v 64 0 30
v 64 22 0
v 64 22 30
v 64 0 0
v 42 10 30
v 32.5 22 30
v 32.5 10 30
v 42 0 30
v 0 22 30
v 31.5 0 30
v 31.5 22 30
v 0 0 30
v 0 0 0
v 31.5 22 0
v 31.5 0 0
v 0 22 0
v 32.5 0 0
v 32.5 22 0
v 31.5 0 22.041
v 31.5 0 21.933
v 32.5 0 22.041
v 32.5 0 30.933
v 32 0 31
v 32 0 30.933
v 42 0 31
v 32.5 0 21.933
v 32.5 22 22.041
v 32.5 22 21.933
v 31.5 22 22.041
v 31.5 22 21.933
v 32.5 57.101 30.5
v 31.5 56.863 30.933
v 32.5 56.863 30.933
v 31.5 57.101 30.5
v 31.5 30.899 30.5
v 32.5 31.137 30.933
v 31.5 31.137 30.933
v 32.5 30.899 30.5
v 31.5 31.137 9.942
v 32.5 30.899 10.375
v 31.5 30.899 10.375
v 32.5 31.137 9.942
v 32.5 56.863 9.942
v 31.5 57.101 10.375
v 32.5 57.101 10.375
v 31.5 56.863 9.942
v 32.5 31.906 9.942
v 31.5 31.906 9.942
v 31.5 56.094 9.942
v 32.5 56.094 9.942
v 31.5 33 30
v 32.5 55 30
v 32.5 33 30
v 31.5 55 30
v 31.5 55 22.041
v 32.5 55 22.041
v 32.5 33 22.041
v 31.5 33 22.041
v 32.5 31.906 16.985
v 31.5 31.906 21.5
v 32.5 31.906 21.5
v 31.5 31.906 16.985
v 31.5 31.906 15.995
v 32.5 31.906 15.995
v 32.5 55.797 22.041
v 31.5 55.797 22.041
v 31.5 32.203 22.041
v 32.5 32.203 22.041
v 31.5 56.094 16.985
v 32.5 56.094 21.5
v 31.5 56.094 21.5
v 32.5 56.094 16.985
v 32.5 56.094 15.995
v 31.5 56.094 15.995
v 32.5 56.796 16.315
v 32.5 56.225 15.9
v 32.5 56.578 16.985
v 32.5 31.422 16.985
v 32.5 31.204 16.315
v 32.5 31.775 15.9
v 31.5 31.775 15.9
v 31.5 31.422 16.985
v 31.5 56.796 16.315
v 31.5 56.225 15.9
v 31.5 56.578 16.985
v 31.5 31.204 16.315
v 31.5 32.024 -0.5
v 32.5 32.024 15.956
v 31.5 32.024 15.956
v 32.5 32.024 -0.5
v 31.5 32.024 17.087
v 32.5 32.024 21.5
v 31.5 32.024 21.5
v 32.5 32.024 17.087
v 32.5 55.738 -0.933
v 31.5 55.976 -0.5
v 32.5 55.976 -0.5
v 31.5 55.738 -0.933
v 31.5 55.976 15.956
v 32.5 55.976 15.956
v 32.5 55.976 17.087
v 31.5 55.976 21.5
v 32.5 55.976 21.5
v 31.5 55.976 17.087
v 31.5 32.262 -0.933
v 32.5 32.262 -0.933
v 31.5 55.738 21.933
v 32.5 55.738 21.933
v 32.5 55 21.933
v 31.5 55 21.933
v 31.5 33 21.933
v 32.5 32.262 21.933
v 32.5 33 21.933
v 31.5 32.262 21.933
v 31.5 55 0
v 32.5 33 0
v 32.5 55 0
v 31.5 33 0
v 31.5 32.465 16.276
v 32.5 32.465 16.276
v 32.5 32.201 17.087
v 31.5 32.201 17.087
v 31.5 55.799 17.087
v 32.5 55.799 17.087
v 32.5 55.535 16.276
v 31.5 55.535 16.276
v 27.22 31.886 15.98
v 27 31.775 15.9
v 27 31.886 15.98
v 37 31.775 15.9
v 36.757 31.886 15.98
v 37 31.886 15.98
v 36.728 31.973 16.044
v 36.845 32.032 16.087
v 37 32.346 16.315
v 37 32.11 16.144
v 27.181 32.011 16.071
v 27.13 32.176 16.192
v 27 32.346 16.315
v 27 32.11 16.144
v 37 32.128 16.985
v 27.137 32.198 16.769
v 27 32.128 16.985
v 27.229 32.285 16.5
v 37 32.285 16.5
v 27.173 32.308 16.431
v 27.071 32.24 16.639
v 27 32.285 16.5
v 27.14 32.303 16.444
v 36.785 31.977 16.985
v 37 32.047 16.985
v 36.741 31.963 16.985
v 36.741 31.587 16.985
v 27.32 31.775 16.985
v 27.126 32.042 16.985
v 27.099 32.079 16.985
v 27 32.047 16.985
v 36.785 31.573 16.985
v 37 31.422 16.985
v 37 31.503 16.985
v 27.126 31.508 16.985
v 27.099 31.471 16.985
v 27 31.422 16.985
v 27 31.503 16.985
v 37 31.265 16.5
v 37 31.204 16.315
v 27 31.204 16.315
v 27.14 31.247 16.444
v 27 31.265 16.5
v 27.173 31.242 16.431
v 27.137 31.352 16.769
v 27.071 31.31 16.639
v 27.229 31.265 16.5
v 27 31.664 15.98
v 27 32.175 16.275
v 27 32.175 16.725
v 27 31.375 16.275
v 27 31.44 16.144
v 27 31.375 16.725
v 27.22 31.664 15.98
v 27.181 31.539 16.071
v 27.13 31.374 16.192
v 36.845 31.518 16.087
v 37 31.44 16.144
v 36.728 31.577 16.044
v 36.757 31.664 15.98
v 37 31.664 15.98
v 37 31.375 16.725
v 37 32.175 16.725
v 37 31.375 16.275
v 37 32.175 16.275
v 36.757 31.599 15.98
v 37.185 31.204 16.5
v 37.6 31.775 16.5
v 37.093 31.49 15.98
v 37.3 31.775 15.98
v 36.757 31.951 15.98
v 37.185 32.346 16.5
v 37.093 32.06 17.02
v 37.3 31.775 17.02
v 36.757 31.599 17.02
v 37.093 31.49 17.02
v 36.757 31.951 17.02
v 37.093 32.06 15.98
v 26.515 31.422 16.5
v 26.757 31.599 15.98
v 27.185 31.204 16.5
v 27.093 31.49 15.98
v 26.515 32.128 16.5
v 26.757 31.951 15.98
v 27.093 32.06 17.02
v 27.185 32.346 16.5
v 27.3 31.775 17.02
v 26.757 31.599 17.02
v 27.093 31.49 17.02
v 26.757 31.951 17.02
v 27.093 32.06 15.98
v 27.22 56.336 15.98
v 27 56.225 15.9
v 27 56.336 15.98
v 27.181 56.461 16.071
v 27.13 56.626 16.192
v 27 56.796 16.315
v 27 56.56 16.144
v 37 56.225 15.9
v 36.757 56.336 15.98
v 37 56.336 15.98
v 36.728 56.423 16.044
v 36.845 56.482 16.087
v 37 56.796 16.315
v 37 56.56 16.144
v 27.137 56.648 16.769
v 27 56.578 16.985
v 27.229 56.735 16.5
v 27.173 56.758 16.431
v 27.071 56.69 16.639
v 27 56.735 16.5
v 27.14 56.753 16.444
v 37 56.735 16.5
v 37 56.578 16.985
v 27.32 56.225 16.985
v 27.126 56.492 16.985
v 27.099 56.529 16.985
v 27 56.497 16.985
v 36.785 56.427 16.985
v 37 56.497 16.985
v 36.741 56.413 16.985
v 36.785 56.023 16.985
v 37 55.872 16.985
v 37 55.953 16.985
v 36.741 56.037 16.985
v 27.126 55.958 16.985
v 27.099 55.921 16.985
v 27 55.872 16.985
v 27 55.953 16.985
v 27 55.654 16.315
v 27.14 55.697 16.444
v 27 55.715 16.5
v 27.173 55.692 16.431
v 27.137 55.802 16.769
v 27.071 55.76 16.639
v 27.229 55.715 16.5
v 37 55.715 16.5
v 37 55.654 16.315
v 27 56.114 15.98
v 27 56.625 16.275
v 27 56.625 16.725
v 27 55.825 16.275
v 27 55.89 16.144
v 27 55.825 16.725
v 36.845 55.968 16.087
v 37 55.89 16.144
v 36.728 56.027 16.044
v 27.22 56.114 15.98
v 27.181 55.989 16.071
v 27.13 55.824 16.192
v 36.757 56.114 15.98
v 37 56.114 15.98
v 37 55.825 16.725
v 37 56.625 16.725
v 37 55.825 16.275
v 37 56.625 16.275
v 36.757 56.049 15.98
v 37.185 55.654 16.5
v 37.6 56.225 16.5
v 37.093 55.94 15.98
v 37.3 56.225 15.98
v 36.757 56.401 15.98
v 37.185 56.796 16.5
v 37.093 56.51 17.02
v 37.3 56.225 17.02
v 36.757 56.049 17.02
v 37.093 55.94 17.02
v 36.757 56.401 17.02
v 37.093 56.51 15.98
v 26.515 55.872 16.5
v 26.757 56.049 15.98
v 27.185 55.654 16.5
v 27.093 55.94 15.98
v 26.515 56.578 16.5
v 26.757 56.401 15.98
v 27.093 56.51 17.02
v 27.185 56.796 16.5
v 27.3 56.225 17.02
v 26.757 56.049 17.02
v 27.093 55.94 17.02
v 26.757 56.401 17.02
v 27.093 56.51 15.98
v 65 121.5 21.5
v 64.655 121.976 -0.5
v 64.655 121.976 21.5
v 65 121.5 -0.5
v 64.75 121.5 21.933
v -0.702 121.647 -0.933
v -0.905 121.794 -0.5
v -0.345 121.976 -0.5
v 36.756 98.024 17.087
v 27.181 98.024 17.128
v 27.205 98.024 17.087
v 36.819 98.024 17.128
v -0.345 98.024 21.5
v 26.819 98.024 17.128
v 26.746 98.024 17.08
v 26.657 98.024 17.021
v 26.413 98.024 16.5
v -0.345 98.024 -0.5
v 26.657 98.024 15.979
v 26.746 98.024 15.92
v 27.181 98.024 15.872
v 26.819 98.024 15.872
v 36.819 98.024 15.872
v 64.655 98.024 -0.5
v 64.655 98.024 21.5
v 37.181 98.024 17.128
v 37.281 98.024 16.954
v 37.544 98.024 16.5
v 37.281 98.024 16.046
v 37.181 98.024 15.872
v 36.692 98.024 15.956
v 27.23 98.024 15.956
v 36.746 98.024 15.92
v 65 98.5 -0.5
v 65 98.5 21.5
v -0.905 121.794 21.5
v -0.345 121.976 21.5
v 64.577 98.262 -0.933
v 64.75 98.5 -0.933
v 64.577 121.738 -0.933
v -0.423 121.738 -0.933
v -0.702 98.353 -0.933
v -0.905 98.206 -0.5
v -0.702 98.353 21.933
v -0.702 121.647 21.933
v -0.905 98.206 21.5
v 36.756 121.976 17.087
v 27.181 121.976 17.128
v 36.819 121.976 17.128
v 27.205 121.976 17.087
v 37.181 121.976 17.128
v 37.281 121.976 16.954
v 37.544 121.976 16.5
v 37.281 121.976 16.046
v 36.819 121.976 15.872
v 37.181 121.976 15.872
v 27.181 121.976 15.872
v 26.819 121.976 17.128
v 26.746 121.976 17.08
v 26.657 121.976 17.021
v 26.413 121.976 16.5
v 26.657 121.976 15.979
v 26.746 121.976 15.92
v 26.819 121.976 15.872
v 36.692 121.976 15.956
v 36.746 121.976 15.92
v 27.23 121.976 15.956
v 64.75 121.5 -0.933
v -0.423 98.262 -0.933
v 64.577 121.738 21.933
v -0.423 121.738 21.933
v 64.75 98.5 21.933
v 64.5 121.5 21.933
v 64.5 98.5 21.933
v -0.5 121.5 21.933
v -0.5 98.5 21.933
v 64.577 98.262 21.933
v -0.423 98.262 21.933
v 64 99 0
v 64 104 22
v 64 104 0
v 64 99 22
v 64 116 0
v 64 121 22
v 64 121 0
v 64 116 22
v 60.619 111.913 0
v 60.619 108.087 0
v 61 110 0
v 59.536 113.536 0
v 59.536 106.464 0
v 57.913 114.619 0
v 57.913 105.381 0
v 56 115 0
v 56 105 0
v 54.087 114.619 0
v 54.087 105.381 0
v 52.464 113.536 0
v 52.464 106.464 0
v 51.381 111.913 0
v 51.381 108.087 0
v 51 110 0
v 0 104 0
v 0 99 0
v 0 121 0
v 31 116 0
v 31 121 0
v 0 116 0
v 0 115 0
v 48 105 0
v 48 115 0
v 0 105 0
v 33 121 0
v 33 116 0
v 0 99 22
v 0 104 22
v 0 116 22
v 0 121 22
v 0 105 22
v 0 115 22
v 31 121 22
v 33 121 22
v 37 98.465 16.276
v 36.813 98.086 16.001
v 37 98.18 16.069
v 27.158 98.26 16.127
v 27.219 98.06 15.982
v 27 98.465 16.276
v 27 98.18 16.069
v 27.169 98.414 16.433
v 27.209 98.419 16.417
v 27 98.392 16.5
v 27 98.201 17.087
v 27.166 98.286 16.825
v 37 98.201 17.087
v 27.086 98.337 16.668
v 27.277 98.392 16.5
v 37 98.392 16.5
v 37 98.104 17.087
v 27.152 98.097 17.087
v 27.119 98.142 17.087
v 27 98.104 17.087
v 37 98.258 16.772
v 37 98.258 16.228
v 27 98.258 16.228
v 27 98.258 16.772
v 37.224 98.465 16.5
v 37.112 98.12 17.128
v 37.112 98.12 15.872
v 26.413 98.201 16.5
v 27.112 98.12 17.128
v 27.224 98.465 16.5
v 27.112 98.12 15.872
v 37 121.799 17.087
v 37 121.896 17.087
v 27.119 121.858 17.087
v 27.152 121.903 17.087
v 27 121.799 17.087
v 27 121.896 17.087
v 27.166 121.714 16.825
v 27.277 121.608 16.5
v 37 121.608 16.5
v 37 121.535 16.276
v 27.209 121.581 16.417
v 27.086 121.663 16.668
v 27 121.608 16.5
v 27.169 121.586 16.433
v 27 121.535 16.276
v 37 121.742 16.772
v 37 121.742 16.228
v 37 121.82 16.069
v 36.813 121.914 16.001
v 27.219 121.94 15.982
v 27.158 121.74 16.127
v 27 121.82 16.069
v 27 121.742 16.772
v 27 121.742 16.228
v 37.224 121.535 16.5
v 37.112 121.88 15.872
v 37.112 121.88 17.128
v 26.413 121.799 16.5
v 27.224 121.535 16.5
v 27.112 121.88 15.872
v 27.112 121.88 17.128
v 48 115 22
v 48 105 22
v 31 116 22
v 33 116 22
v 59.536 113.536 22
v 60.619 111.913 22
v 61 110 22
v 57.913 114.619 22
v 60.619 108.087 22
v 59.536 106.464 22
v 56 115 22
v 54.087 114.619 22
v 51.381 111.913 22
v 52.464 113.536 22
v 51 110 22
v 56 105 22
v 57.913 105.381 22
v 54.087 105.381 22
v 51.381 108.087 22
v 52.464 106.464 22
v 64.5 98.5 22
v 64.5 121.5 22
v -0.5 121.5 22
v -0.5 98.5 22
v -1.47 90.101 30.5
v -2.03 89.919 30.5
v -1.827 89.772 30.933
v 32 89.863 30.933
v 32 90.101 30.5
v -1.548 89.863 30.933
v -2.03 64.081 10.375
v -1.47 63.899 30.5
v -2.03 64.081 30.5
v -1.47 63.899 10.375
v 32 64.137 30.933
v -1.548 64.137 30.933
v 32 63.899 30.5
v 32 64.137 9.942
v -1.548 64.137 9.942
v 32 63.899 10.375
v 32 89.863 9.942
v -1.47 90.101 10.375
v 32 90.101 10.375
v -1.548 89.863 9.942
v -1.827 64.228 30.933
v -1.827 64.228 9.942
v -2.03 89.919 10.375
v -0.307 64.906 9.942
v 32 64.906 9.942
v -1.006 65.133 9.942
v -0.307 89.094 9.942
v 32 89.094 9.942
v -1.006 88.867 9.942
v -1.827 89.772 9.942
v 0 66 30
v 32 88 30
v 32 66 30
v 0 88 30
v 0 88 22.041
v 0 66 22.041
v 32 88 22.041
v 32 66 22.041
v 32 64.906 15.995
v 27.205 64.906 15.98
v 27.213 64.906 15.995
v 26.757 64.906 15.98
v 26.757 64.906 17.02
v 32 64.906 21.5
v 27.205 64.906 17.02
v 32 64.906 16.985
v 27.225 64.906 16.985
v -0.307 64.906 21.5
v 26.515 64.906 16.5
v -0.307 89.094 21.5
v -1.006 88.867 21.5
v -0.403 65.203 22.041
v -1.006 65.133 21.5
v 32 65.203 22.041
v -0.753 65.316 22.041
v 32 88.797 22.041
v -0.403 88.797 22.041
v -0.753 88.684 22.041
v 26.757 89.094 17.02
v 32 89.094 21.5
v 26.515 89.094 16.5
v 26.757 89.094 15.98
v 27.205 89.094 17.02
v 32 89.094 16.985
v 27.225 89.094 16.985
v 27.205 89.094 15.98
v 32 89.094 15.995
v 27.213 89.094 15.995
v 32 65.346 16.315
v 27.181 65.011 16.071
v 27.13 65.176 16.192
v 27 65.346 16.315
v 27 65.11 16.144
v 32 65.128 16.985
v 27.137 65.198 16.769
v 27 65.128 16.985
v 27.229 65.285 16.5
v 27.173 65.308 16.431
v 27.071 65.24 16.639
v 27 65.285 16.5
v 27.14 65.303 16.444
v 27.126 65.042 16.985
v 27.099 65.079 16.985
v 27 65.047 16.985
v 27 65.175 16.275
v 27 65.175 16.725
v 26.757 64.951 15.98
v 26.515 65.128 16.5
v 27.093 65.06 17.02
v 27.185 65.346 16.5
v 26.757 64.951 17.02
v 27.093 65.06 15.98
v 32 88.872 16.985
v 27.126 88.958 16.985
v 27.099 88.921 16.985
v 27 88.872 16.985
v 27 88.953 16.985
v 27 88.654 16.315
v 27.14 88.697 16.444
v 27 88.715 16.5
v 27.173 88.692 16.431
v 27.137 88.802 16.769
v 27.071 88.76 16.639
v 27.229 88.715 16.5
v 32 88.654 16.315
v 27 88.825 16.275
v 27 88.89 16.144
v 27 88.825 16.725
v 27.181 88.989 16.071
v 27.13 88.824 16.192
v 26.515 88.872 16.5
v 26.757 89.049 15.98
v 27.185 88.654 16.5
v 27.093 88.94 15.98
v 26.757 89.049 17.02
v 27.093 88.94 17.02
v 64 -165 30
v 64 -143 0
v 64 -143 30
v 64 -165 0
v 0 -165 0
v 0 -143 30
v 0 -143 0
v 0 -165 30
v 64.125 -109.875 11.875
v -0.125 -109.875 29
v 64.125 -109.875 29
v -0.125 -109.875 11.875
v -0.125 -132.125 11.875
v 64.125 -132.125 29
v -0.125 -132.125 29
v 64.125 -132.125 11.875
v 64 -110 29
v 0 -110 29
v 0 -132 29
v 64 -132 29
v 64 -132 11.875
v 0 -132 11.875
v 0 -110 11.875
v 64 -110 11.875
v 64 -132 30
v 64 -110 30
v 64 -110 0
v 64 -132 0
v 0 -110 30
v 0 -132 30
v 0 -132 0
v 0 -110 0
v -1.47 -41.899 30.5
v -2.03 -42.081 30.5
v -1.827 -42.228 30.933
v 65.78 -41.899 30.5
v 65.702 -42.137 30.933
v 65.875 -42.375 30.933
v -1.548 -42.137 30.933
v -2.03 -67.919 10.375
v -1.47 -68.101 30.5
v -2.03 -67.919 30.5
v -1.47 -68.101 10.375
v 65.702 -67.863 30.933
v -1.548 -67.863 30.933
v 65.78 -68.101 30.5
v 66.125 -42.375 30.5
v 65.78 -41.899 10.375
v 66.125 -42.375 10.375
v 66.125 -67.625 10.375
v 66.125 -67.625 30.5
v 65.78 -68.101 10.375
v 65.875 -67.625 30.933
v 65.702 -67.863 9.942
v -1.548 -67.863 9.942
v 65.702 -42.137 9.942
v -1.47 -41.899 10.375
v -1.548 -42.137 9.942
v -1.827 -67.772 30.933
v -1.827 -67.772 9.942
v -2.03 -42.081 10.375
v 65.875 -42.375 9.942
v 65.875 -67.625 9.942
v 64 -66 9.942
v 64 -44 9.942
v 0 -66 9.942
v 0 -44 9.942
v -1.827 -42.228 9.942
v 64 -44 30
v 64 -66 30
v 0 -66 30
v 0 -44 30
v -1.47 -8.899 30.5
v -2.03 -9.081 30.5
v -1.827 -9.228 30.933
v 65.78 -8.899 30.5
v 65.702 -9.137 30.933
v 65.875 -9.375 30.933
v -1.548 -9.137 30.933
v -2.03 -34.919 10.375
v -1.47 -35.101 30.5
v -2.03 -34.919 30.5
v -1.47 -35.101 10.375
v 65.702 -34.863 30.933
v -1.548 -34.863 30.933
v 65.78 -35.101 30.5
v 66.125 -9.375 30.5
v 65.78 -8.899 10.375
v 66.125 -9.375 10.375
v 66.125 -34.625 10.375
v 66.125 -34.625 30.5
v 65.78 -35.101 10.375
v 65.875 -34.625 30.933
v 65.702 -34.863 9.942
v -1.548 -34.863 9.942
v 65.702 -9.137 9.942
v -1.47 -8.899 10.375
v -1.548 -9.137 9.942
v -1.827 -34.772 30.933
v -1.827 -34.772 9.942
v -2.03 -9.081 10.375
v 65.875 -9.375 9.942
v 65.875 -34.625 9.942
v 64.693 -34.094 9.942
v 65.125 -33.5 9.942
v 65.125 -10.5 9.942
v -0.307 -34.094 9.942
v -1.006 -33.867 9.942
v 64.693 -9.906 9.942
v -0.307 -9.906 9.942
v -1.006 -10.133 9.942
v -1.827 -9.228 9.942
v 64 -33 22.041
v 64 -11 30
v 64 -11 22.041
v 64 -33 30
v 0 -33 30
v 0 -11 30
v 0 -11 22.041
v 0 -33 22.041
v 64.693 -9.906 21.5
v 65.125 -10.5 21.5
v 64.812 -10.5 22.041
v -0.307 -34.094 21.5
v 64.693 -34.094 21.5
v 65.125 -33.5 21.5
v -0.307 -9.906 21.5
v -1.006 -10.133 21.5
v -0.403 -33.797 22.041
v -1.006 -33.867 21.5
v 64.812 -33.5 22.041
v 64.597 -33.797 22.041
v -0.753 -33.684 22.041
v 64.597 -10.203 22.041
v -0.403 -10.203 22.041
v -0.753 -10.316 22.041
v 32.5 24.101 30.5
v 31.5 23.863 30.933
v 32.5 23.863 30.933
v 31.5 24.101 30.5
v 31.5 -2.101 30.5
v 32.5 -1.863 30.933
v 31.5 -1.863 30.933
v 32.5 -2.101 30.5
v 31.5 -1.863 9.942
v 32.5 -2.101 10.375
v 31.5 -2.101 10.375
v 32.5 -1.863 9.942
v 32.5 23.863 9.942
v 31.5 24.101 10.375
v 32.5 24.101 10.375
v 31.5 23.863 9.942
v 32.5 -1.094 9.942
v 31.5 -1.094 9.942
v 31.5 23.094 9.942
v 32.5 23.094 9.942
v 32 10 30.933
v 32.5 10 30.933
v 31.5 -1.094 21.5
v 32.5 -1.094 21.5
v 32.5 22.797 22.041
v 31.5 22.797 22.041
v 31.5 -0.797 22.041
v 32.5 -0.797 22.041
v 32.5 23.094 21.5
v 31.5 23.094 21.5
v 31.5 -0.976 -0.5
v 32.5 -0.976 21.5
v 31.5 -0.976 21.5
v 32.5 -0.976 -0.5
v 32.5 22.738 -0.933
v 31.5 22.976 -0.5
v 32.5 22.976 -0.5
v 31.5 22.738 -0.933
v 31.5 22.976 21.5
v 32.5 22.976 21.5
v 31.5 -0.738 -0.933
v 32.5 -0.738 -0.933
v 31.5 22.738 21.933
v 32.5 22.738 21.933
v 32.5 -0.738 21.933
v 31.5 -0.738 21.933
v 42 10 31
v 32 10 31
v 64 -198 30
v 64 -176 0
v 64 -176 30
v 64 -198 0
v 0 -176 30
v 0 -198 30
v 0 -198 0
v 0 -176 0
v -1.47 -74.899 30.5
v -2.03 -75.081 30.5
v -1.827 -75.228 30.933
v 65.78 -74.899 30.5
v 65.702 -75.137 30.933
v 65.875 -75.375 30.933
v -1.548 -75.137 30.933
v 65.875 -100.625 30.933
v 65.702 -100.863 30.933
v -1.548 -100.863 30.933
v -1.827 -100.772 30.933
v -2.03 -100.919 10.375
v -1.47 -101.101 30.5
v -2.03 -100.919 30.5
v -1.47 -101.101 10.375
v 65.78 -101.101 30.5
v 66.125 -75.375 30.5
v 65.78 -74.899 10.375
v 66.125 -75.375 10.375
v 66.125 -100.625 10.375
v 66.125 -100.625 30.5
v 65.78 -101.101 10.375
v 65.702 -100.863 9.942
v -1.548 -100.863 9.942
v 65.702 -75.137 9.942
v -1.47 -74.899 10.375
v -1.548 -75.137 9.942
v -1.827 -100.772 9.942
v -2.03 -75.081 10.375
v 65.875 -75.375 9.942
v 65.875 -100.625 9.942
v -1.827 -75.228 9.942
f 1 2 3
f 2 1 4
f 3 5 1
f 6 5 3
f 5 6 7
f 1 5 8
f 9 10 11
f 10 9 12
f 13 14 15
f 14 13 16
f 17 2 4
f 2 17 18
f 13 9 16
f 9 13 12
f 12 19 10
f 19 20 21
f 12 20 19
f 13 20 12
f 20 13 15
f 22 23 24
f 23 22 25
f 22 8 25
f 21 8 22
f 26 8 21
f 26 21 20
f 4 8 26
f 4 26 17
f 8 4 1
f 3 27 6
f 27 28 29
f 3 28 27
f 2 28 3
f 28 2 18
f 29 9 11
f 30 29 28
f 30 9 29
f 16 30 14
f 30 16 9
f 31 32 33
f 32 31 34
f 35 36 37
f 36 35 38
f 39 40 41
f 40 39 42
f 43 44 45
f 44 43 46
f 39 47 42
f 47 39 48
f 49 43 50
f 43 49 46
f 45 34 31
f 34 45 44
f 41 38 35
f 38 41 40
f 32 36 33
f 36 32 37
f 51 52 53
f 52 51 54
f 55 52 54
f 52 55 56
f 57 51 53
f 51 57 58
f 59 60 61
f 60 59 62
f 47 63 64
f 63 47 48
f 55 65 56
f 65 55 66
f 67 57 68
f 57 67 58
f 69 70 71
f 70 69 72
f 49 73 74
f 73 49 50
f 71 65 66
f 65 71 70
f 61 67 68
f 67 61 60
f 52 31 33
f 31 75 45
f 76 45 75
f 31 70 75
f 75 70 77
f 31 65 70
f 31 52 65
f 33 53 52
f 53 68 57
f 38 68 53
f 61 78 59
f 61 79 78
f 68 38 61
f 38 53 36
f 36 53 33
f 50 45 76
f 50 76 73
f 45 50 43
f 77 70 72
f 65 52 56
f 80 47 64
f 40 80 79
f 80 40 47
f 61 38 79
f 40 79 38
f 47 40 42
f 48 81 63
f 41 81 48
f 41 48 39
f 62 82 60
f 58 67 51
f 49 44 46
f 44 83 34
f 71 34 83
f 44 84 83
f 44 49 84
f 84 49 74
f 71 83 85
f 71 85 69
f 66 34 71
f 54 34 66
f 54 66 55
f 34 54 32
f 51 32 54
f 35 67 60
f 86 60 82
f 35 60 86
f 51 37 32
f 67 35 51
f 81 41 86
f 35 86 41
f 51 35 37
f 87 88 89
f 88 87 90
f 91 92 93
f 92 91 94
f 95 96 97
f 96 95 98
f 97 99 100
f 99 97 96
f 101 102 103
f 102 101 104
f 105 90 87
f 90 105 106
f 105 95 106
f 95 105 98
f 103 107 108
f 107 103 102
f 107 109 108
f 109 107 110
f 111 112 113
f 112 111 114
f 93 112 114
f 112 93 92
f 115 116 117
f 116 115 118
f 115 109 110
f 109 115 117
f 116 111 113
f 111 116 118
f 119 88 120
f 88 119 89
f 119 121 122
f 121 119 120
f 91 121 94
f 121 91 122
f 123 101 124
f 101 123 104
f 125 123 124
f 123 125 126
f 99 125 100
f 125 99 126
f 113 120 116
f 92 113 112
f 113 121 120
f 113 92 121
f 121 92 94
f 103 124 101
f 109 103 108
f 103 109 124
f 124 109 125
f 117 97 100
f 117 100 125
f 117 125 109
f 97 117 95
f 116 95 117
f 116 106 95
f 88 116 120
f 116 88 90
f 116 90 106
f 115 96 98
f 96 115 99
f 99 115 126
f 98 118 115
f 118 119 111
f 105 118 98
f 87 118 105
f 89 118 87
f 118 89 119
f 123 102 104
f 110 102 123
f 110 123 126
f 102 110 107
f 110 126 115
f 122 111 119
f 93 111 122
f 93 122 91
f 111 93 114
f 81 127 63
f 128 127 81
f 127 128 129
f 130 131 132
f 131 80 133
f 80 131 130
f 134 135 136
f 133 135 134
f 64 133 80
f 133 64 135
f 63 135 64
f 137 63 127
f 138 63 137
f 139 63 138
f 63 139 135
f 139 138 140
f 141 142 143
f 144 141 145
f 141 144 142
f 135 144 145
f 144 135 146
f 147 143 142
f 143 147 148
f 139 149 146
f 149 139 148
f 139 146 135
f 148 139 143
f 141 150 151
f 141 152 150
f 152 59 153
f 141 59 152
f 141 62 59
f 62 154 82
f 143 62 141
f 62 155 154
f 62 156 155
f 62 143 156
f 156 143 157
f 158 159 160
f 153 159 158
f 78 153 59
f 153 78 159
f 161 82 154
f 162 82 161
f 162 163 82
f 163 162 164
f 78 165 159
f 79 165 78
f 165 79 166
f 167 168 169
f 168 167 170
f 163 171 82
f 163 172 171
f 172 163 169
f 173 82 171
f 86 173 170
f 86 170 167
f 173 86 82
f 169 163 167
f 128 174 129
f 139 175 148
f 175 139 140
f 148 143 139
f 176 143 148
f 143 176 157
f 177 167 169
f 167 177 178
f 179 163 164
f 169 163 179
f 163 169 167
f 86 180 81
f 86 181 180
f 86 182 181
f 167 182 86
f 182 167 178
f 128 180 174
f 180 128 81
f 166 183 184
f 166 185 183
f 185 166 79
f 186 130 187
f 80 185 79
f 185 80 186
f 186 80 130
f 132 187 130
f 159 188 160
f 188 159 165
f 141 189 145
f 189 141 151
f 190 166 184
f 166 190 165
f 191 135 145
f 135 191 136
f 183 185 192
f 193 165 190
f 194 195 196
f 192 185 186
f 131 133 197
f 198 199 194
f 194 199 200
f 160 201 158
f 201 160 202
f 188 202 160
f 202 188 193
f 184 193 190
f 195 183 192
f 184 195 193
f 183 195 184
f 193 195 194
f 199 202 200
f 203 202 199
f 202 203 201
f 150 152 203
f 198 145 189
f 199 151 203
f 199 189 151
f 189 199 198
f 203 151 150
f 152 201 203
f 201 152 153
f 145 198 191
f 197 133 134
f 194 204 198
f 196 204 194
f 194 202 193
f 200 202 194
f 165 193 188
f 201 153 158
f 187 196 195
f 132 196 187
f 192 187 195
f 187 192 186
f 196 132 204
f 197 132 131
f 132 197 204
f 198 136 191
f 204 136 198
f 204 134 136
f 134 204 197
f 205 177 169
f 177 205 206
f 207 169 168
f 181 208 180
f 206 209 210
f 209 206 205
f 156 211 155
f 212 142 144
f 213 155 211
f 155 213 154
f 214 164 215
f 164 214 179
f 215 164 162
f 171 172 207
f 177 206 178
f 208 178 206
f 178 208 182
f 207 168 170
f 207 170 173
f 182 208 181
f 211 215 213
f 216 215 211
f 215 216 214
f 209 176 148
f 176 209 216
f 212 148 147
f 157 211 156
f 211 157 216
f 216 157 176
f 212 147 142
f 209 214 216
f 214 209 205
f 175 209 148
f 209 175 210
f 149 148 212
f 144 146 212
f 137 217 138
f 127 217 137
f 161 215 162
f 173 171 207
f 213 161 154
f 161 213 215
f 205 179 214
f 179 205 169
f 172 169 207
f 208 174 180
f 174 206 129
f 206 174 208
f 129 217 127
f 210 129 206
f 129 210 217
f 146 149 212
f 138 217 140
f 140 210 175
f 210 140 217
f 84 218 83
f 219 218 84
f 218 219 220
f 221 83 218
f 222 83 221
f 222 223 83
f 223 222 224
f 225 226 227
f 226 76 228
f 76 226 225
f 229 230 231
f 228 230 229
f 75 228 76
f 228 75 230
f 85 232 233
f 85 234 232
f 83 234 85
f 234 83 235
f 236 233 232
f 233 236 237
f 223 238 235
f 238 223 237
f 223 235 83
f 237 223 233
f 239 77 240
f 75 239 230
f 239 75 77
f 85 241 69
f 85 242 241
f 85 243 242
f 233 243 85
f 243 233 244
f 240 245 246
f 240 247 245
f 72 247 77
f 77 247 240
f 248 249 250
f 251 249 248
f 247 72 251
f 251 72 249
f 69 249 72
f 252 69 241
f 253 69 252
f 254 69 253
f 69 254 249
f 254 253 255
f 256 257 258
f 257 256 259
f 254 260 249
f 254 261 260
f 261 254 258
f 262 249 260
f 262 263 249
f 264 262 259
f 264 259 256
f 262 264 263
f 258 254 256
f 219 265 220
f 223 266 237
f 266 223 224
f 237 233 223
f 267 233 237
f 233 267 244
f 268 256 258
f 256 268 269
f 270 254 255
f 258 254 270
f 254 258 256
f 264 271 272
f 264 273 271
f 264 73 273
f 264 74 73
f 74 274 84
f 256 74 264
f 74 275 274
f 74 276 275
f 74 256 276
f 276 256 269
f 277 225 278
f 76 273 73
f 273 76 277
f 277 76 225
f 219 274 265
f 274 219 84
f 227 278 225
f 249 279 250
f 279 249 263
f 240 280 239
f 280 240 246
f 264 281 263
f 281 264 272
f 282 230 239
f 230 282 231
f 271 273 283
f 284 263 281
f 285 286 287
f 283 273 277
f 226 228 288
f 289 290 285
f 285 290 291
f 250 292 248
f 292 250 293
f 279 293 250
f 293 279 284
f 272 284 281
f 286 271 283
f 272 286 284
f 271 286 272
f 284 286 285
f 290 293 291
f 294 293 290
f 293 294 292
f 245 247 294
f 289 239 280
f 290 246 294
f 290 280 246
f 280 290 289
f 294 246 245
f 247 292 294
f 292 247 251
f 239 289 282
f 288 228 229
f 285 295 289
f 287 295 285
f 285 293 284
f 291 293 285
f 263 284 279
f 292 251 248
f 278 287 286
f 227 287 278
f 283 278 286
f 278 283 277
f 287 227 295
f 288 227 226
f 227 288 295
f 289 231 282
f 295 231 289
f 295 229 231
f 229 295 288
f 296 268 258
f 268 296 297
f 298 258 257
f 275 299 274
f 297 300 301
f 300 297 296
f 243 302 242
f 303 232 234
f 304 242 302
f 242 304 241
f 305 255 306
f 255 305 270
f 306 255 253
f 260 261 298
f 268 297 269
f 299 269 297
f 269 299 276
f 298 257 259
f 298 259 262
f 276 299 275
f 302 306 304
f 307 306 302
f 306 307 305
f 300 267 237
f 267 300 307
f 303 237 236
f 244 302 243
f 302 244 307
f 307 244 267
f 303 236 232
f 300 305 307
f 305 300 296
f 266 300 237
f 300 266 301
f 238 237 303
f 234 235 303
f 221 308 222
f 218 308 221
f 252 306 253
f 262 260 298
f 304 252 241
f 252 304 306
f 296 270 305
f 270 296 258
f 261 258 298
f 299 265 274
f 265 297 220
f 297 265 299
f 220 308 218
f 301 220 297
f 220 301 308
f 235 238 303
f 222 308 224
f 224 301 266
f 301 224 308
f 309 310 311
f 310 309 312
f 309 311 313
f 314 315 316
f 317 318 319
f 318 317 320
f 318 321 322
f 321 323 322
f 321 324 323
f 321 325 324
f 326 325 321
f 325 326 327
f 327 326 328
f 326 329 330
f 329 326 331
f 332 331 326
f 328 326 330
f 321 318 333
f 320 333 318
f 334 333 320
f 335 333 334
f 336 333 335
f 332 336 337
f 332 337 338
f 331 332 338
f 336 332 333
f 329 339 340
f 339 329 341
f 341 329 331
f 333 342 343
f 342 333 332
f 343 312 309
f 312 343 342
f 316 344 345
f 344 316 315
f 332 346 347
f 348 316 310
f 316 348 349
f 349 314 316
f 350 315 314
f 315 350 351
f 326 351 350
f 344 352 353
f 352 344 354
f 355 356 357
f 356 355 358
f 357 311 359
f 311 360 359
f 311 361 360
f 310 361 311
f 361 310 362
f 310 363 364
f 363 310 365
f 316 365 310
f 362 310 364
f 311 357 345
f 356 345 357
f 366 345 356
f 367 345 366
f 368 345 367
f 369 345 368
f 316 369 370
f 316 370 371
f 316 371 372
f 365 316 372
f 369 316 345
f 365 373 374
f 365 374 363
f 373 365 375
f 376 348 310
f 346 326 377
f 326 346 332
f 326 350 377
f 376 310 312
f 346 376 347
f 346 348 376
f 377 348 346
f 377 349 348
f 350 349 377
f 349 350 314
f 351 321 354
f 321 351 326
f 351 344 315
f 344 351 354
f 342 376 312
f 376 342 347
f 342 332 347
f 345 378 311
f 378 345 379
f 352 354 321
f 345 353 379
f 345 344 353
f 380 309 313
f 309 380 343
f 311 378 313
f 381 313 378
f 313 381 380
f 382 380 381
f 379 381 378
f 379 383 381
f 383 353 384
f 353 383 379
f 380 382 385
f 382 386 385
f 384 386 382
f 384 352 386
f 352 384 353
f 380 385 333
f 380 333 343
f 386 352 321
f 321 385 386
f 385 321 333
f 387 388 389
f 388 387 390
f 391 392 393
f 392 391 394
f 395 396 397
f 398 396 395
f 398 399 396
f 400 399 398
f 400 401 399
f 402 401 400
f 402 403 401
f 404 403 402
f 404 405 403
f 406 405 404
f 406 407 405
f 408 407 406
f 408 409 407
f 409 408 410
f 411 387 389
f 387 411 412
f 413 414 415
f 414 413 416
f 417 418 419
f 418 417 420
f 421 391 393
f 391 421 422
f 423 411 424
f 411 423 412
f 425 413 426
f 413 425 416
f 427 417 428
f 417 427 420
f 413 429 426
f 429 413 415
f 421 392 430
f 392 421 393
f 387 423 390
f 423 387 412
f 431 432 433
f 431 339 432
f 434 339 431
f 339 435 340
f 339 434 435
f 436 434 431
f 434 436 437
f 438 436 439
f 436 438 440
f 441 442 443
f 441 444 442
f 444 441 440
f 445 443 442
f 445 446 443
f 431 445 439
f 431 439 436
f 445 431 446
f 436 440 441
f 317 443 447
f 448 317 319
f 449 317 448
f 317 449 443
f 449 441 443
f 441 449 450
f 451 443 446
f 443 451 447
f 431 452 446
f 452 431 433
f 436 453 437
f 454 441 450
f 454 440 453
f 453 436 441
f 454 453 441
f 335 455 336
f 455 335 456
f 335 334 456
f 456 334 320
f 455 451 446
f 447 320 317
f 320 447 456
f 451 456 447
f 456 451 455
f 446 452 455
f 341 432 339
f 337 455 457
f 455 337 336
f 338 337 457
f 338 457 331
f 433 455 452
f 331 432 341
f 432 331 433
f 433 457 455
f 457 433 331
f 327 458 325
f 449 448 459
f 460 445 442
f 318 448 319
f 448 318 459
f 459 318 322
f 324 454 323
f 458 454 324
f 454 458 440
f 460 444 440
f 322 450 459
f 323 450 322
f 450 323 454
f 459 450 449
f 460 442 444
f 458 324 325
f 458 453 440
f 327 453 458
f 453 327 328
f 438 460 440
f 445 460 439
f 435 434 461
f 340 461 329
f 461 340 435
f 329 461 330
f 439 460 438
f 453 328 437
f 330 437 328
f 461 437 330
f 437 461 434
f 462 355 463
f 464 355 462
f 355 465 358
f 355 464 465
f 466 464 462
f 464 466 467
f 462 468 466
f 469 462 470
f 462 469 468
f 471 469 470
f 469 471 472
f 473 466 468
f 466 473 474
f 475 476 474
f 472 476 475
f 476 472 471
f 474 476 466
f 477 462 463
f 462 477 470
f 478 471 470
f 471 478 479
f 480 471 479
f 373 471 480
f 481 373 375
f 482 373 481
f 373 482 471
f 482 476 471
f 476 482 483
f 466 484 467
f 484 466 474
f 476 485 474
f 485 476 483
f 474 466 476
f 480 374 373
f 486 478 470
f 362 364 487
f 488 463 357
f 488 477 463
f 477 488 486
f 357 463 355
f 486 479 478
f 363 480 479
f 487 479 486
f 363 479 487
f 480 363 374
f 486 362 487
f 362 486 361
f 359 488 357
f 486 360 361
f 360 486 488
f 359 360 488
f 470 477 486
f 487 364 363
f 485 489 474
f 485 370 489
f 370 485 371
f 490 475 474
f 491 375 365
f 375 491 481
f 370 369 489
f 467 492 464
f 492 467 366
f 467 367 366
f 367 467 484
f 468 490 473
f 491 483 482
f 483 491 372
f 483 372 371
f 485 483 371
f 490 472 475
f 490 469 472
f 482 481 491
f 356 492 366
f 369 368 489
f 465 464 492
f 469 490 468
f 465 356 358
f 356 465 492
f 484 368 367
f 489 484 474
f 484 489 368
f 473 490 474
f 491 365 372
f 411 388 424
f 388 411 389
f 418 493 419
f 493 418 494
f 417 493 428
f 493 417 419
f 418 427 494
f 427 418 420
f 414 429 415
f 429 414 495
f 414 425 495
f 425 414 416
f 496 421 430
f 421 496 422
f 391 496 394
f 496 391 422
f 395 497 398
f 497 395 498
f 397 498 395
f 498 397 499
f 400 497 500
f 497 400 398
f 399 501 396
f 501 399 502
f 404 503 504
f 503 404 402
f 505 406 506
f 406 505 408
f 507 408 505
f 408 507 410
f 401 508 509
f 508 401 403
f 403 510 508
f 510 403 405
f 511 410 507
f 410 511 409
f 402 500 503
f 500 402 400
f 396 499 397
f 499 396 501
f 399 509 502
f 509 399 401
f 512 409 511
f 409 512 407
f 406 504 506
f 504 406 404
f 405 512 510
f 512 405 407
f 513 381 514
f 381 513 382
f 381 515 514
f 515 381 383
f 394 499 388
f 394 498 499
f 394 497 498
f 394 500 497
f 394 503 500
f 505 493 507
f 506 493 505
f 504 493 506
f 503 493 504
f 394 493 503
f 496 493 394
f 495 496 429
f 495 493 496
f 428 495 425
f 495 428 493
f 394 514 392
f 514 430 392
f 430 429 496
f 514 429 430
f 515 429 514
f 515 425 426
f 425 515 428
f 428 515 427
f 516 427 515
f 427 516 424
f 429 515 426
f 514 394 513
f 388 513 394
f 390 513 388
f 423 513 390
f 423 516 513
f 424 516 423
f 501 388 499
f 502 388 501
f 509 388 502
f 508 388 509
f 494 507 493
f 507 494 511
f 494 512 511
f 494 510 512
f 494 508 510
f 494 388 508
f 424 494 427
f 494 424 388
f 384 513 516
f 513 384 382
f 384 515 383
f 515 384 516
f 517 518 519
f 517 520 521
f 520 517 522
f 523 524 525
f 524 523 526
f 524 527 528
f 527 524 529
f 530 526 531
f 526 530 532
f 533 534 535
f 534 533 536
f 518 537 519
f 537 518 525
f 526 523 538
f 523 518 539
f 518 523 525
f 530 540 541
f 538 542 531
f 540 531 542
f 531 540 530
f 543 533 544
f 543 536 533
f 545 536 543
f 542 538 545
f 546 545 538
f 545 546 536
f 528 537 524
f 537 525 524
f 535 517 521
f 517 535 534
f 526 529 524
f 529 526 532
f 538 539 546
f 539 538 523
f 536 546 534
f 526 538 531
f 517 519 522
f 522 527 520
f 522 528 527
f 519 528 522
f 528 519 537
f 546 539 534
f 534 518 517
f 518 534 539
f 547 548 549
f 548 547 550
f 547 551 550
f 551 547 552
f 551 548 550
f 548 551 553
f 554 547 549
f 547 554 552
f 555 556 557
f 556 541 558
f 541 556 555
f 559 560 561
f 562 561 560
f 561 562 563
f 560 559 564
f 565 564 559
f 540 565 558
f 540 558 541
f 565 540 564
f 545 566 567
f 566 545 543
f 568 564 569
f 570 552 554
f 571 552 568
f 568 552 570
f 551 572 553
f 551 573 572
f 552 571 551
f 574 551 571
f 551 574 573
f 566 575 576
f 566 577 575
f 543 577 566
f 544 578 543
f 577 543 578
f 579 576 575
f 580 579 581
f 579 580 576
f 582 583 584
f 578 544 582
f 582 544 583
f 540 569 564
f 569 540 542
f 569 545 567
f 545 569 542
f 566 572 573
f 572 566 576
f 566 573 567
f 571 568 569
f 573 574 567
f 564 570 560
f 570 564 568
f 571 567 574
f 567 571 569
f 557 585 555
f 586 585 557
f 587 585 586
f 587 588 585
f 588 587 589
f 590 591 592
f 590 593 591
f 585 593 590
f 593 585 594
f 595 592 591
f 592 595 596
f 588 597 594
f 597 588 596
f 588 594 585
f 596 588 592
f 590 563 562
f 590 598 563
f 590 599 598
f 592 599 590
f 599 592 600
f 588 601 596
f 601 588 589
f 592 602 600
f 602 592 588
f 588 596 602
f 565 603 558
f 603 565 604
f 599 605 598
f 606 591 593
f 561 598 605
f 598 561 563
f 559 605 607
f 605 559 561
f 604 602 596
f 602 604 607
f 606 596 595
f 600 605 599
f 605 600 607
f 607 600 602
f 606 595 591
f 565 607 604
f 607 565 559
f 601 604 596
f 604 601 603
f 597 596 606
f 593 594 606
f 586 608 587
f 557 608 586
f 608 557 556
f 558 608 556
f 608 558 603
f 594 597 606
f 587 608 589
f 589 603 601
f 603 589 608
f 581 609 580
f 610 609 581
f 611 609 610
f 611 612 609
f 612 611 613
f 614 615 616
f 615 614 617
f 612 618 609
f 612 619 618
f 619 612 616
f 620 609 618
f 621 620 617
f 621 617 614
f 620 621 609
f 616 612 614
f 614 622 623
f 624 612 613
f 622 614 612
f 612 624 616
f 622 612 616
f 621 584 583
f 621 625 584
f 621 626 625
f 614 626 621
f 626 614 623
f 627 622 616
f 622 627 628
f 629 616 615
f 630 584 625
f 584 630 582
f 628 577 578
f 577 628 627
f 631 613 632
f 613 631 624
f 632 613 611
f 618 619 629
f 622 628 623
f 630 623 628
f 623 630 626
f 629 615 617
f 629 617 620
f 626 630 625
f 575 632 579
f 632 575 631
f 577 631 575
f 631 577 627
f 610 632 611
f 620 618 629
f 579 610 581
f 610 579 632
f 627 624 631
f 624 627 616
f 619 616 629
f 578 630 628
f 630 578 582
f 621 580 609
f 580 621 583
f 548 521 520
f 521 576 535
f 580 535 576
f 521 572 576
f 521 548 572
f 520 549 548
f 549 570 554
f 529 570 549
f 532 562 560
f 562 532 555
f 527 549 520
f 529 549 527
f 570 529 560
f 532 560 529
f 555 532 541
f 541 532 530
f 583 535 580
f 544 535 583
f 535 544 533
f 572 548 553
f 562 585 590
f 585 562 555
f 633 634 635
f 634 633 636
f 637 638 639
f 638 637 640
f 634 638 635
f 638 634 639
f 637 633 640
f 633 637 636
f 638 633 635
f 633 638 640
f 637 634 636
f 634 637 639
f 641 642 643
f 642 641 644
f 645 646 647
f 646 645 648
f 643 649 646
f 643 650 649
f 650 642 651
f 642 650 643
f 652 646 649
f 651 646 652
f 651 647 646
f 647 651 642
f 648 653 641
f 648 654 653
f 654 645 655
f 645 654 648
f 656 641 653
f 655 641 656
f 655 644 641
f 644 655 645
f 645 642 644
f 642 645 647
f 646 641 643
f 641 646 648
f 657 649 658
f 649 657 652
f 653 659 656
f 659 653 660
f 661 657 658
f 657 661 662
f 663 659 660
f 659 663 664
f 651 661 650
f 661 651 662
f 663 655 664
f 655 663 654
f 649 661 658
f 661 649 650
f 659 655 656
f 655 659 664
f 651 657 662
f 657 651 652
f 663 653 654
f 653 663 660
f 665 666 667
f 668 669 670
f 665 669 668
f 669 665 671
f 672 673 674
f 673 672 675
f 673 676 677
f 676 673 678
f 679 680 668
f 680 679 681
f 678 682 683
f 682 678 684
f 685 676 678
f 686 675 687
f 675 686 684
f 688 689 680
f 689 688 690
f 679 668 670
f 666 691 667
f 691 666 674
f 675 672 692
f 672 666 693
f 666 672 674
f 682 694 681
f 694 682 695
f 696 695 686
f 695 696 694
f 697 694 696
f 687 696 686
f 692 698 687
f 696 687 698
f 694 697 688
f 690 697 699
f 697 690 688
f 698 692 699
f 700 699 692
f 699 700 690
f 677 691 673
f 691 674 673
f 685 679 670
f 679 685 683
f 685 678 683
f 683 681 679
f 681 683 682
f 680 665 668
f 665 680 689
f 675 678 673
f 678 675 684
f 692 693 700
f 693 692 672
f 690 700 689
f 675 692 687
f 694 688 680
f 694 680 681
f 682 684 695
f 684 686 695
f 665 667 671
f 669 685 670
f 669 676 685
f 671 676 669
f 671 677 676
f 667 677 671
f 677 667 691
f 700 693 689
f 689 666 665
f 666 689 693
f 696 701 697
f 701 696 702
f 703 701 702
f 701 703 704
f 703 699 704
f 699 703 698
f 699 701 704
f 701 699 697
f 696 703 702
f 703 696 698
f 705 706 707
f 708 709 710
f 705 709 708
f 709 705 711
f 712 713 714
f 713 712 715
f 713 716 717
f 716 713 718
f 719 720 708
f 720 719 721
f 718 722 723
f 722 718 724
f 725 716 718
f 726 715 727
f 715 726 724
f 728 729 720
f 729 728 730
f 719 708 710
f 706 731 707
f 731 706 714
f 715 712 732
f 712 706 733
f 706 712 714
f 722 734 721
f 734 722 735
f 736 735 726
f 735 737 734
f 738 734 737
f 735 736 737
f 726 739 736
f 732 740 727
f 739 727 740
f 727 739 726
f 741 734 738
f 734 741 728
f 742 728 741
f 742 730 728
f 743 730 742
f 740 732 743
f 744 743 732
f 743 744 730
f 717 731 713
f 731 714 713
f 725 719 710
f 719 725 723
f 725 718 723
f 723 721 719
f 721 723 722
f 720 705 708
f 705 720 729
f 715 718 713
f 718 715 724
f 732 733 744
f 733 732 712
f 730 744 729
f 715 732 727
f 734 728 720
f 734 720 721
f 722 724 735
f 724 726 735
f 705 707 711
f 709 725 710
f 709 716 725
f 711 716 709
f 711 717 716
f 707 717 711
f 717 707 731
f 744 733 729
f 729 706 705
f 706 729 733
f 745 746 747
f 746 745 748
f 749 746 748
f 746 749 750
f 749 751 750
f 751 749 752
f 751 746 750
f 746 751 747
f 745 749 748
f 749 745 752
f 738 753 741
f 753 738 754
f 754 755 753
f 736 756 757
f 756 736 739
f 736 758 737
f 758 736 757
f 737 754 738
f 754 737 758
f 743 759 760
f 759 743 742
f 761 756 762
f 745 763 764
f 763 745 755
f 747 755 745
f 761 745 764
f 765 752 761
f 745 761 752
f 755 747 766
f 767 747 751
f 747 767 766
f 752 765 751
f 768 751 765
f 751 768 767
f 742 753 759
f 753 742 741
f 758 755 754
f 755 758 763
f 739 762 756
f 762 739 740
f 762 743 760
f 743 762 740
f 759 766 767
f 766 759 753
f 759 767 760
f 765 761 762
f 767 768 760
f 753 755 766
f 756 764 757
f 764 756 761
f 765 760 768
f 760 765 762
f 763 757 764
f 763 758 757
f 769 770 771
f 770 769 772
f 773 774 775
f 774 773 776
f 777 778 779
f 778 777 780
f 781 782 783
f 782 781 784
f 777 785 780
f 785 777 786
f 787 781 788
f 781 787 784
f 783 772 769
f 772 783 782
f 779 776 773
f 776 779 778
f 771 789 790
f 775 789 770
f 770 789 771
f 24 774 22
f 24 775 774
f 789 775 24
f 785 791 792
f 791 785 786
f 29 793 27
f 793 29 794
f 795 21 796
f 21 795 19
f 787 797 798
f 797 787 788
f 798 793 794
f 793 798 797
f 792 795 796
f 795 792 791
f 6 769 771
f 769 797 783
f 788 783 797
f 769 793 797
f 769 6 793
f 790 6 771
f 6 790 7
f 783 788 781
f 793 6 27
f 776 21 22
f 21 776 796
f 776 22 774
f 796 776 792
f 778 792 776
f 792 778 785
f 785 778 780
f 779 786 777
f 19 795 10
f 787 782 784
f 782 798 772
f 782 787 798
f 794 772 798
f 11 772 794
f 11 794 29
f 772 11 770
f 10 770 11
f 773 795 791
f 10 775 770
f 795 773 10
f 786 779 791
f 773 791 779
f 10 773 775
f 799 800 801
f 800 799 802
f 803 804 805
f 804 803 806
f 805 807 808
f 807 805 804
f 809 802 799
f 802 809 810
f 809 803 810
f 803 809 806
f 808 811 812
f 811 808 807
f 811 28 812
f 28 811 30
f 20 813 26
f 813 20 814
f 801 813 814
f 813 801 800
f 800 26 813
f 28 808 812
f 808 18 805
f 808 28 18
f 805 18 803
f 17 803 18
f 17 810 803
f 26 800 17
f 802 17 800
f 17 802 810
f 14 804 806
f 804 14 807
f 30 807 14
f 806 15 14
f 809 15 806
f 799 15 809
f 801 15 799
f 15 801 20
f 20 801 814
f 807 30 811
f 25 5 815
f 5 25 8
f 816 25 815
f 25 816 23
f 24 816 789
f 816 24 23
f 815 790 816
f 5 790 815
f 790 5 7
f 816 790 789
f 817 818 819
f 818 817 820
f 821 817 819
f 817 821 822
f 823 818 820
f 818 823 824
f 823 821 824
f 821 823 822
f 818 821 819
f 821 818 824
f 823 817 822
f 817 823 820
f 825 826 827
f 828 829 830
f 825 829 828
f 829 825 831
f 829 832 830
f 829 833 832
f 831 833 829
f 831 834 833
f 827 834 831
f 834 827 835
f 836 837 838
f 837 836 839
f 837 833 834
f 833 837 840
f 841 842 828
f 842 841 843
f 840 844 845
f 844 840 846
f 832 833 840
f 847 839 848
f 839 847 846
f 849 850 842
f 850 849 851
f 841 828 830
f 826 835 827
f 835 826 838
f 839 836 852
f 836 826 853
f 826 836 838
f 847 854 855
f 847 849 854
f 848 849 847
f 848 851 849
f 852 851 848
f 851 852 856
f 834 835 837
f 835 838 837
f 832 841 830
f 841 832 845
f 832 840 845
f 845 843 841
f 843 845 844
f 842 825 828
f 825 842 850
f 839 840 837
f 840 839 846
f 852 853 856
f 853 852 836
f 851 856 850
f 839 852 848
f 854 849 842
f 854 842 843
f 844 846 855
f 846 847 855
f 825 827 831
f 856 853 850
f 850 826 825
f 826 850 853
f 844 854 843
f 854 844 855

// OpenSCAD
// file: 05_locker.scad
include <00_main.scad>;

use <03_first_shell.scad>;
use <04_second_shell.scad>;


module _pill_core_locker(offset=0) {
    rotate([0,90,0])
    cylinder(h=locker_x, r=locker_r+offset, center=true);
}

module 05_pill_locker(offset=0) {    
    _pill_core_locker(offset);
    
    translate([locker_x/2,0,0])
    sphere(r=locker_r+offset);
    
    translate([-locker_x/2,0,0])
    sphere(r=locker_r+offset);
}


module 05_pill_locker_mid_position(with_offset=false) {
    mid_overlay = size_z * (1 - top_overlay + (top_overlay - top_part)/2);
    offset_val = with_offset ? second_shell_offset : 0;
    shift_y = second_shell_offset + size_wall + locker_y;

    translate([
        size_x/2,
        -shift_y,
        mid_overlay])
    05_pill_locker(offset=offset_val);
    
    translate([
        size_x/2,
        size_y + shift_y,
        mid_overlay])
    05_pill_locker(offset=offset_val);
}


// DEVELOPING ################################

module 05_slide_with_locker() {
    size_debug = size_wall * 10;
    alpha_debug = 0.5;

    intersection() {
        04_second_shell();
        01_debug_slice();
    }

    intersection() {
        difference() {
            03_first_shell();
            05_pill_locker_mid_position(with_offset=true);
        }
        01_debug_slice();
    }

    intersection() {
        translate([0,0,0]);
        05_pill_locker();
        01_debug_slice();
    }

    05_pill_locker_mid_position();
}

module 05_developing() {
    debug_shift = 10;
    steps = 4;  // decrease step number for better understanding

    translate([0, - (steps - 0) * (debug_shift * 1.5), 0]) {
        _pill_core_locker();
    }

    translate([0, - (steps - 1) * (debug_shift * 1.5), 0]) {
        05_pill_locker();
    }

    translate([0, - (steps - 2) * (debug_shift * 1.5), 0]) {
        05_pill_locker(offset=0.1);
    }

    translate([0, - (steps - 3) * (debug_shift * 1.5), 0]) {
        tmp = 0.1;
        
        difference() {
            #cube([6,2,2]);
            05_pill_locker(offset=tmp);
        }
        
        intersection() {
            cube([6,2,2]);
            05_pill_locker();
        }
    }

    translate([0, - (steps - 4) * (debug_shift * 1.5), 0]) {
        05_slide_with_locker();
    }

}

// Do not forget put all structures under a comment in 00_main.scad
05_developing();
// file: 02_internal_walls.scad
include <00_main.scad>;
use <01_shared.scad>;


module _min_vol_n_half_wall() {
    minkowski() {
        union() {
            01_min_bottom_vol();
            translate([0,0,size_wall/2])
            01_min_bottom_vol();
        }
        cube(size_wall, center = true);
    }
}

module 02_internal_walls() {
    difference() {
        _min_vol_n_half_wall();
        00_initial_forms();
    }
}


// DEVELOPING ################################

module 02_developing() {
    steps = 3;  // decrease step number for better understanding

    translate([0, - (steps - 0) * (size_y * 1.5), 0]) {
        00_initial_forms();
        #01_min_vol();
    }

    translate([0, - (steps - 1) * (size_y * 1.5), 0]) {
        01_min_bottom_vol();
    }

    translate([0, - (steps - 2) * (size_y * 1.5), 0]) {
        _min_vol_n_half_wall();
    }

    translate([0, - (steps - 3) * (size_y * 1.5), 0]) {
        02_internal_walls();
    }
}

// Do not forget put all structures under a comment in 00_main.scad
02_developing();
// file: 06_assembling.scad
include <00_main.scad>;

use <02_internal_walls.scad>
use <03_first_shell.scad>;
use <04_second_shell.scad>;
use <05_locker.scad>;

module 05_first_final_shell() {
    if (with_locker) {
        difference() {
            03_first_shell();
            05_pill_locker_mid_position(with_offset=true);
        }
    }
    else {
        03_first_shell();
    }
    02_internal_walls();
}

module 05_second_final_shell() {
    04_second_shell();
    if (with_locker) {
        05_pill_locker_mid_position(with_offset=false);
    }
}

module 05_preview() {
    00_initial_forms(); #01_min_vol();

    translate([0, size_y * 1.5, 0])
    if (with_locker) {
        05_slide_with_locker();
    } else {
        04_slide();
    }

    translate([0, size_y * 4.5, 0])
    05_first_final_shell();

    translate([0, size_y * 3, 0])
    intersection(){
        05_second_final_shell();
        cube([size_x,size_y*3,size_z*3], center=true);
    }
}


// DEVELOPING ################################

module 05_developing() {    
    05_first_final_shell();

    mirror([0, 0, 1])
    translate([0,size_y*1.5,-size_z])
    05_second_final_shell();
}

// Do not forget put all structures under a comment in 00_main.scad
05_developing();
// file: 01_shared.scad
include <00_main.scad>;


module 01_min_vol() {
    cube([size_x,size_y,size_z]);
}

module 01_min_bottom_vol() {
    scale([1,1,1 - top_part])
    01_min_vol();
}

module 01_debug_slice() {
    translate([size_x/2,-size_wall*3,-size_wall*3])
    cube([size_wall, size_y*3, size_z*3], center = true);
}
// file: 03_first_shell.scad
include <00_main.scad>;
use <01_shared.scad>;
use <02_internal_walls.scad>;


module 03_first_solid_shell(second_shell_offset=0) {
    minkowski() {
        01_min_bottom_vol();
        cube(size_wall, center = true);
        sphere(d=size_wall+second_shell_offset*2);
    }
}

module 03_first_shell() {
    difference(){
        03_first_solid_shell();
        01_min_vol();
    }
}


// DEVELOPING ################################

module 03_developing() {
    steps = 5;  // decrease step number for better understanding

    translate([0, - (steps - 0) * (size_y * 1.5), 0]) {
        #01_min_vol();
    }

    translate([0, - (steps - 1) * (size_y * 1.5), 0]) {
        #01_min_vol();
        01_min_bottom_vol();
    }

    translate([0, - (steps - 2) * (size_y * 1.5), 0]) {
        03_first_solid_shell();
    }

    translate([0, - (steps - 3) * (size_y * 1.5), 0]) {
        03_first_shell();
    }

    translate([0, - (steps - 4) * (size_y * 1.5), 0]) {
        02_internal_walls();
    }

    translate([0, - (steps - 5) * (size_y * 1.5), 0]) {
        union() {
            03_first_shell();
            02_internal_walls();
        }
    }
}

// Do not forget put all structures under a comment in 00_main.scad
03_developing();
// file: 00_main.scad
use <01_shared.scad>;
use <06_assembling.scad>;


// PART_0 ################################

module 00_initial_forms() {
translate([0,0,0]) 
cube([64,5,30]);

translate([0,6,0])
cube([48,10,30]);

translate([0,17,0])
cube([31,5,30]);

translate([31 + 2,17,0])
cube([31,5,30]);
    
translate([56,11,0])
cylinder(30, r=5);
}


//00_initial_forms();


// PART_1 ################################

size_x = 64;
size_y = 22; 
size_z = 30;


//00_initial_forms(); #01_min_vol();


// PART_2 ################################

size_wall = 1;
second_shell_offset = 0.125;

top_part = 0.3;
top_overlay = 0.6;
second_shell_cutted_top = true;

with_locker = true;
locker_x = 10;
locker_r = 0.6;
locker_y = 0.1;


05_preview();


// PART_3 ################################

//$fn=60; 05_first_final_shell();
//$fn=60; 05_second_final_shell();
// main file
include <00_main.scad>;
use <03_first_shell.scad>;

// next line is a debug_line - uncomment to use
// second_shell_cutted_top = false; //rewrite var from 00_main


module _secord_core_shell() {
    if (second_shell_cutted_top) {
        difference() {
            translate([0,0,size_z*(1-top_overlay)])
            scale([1,1,top_overlay])
            01_min_vol();

            translate([
                -size_x/4,
                -size_y/4,
                size_z - second_shell_offset - size_wall
            ])
            scale([1.5, 1.5, 1])
            01_min_vol();
        }
    } else {
        translate([0,0,size_z*(1-top_overlay)])
        scale([1,1,top_overlay])
        01_min_vol();
    }
}

module _secord_core_offset_shell() {
    minkowski() {
       _secord_core_shell();
       cube(second_shell_offset*2, center = true); 
    }
}

module _second_solid_shell() {
    minkowski() {
        _secord_core_offset_shell();
        cube(size_wall*3, center = true);
        sphere(d=size_wall);
    }
}

module _second_pre_shell() {
    difference() {
        _second_solid_shell();
        01_min_vol();
    }
}

module 04_second_shell() {
    difference() {
        _second_pre_shell();
        03_first_solid_shell(second_shell_offset);
    }
}

module 04_slide() {
    size_debug = size_wall * 10;
    alpha_debug = 0.5;

    intersection() {
        04_second_shell();
        01_debug_slice();
    }

    intersection() {
        03_first_shell();
        01_debug_slice();
    }

    // RED - first shell
    translate([size_x/2,0,size_z])
    color([1,0,0,alpha_debug])
    cube([size_debug,size_debug,size_wall]);

    if (!second_shell_cutted_top) {
        // GREEN - second_shell_offset
        translate([size_x/2+size_wall,-size_wall,size_z+size_wall])
        color([0,1,0,alpha_debug])
        cube([size_debug,size_debug,second_shell_offset]);

        // BLUE - second shell
        translate([size_x/2+size_wall*2,-size_wall*2,size_z+size_wall+second_shell_offset])
        color([0,0,1,alpha_debug])
        cube([size_debug,size_debug,size_wall]);
    }
}

// DEVELOPING ################################

module 04_developing() {
    steps = 6;  // decrease step number for better understanding

    translate([0, - (steps - 0) * (size_y * 1.5), 0]) {
        #01_min_vol();
    }

    translate([0, - (steps - 1) * (size_y * 1.5), 0]) {
        _secord_core_shell();
        #01_min_vol();
    }

    translate([0, - (steps - 2) * (size_y * 1.5), 0]) {
        _secord_core_offset_shell();
        #01_min_vol();
    }

    translate([0, - (steps - 3) * (size_y * 1.5), 0]) {
        _second_solid_shell();
    }

    translate([0, - (steps - 4) * (size_y * 1.5), 0]) {
        _second_pre_shell();
    }

    translate([0, - (steps - 5) * (size_y * 1.5), 0]) {
        04_second_shell();
    }

    translate([0, - (steps - 6) * (size_y * 1.5), 0]) {
        04_slide();   
    }
}

// Do not forget put all structures under a comment in 00_main.scad
04_developing();
